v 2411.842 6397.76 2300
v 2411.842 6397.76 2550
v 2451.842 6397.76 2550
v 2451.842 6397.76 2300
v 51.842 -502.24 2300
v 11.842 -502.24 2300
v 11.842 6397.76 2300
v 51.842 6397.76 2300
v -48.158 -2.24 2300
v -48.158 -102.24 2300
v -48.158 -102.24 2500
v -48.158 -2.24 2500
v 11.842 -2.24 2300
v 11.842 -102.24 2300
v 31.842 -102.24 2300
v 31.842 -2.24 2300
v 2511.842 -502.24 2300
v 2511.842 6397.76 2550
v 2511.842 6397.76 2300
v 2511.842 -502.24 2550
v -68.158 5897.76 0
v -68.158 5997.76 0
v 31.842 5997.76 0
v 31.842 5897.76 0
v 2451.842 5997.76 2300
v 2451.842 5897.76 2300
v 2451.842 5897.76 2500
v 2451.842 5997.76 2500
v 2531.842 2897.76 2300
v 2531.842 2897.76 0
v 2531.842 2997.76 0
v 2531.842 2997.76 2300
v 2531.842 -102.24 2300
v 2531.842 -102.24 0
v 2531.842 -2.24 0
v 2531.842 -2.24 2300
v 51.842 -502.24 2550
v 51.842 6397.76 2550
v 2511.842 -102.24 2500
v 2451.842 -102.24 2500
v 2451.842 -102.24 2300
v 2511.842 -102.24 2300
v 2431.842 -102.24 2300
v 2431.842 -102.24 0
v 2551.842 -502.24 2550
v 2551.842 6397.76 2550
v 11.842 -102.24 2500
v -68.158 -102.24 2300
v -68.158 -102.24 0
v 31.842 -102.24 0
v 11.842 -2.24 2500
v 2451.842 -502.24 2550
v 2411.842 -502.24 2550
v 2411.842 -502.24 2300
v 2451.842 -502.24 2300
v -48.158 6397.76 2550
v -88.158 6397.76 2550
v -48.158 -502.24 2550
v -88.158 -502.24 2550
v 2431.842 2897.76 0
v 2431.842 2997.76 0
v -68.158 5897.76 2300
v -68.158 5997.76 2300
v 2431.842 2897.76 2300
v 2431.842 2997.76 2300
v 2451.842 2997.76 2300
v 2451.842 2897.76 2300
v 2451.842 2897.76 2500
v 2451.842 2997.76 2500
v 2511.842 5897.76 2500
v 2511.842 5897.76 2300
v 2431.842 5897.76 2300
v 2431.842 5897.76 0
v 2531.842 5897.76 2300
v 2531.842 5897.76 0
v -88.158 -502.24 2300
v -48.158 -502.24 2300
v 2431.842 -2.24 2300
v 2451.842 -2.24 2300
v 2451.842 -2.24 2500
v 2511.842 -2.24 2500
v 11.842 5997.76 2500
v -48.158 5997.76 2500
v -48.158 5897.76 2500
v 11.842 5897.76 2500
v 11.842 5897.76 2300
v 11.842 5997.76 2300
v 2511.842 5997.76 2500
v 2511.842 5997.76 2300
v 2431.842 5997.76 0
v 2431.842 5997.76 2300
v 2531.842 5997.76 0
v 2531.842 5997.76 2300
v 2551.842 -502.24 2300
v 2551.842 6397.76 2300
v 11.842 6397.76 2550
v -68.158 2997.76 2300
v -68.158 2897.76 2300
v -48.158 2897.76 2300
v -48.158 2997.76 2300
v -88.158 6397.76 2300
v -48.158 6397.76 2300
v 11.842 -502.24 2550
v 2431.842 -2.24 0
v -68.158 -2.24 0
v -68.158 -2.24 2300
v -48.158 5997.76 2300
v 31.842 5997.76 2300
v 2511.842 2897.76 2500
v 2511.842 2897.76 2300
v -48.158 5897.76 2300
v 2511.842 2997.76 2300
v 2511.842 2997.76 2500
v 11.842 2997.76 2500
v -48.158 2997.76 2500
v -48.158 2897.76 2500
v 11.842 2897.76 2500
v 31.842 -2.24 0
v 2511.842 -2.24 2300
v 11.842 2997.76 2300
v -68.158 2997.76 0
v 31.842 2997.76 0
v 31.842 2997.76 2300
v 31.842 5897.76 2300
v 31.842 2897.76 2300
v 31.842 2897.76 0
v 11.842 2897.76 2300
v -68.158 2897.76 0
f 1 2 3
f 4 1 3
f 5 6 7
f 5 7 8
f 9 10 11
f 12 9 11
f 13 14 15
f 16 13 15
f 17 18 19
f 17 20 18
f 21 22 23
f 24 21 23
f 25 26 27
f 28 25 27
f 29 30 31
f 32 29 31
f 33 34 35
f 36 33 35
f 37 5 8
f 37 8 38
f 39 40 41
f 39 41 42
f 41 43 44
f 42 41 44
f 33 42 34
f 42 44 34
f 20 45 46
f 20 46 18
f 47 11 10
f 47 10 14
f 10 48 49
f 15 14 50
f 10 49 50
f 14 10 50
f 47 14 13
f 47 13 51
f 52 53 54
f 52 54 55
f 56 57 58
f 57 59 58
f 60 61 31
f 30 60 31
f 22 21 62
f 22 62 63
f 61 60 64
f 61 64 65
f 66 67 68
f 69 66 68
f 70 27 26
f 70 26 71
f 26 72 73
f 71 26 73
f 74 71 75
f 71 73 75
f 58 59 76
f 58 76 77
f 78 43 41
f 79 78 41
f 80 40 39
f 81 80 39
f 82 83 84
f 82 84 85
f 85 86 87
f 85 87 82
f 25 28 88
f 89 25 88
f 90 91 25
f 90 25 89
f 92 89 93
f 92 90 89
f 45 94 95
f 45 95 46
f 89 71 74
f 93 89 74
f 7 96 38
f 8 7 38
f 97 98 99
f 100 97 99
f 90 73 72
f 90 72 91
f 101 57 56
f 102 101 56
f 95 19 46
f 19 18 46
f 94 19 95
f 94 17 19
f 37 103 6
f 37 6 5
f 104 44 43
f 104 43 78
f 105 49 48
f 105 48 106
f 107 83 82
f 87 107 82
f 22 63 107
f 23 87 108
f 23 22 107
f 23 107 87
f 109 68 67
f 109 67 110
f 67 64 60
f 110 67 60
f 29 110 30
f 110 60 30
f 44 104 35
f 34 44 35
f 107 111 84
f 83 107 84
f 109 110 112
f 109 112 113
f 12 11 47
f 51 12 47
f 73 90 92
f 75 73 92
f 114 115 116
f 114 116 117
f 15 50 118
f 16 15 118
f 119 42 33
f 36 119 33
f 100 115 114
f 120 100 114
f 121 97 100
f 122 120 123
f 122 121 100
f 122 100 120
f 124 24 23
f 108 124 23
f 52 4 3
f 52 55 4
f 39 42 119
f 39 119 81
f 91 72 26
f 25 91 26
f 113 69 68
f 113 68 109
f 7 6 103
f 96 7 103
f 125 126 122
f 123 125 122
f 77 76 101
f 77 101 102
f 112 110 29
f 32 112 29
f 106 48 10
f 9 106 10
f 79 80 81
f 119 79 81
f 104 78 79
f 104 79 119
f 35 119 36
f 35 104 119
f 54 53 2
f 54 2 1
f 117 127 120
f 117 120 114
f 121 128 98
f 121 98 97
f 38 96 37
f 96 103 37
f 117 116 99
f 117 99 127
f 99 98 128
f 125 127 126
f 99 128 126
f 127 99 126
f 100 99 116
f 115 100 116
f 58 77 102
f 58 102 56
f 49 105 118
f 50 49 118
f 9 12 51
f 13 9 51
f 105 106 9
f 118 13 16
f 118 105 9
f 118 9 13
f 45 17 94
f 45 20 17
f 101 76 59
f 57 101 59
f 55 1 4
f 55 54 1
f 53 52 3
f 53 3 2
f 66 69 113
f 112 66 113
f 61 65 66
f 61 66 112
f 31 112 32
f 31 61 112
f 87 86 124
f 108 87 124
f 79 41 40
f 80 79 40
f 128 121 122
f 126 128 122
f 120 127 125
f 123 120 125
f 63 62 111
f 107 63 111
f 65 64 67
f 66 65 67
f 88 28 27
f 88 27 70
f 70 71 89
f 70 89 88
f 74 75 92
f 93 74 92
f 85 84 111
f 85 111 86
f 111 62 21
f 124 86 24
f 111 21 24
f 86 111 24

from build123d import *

# Parameters (mm, degrees)
F2_W          = 100
F2_H          = 100
F3_DEPTH      = 2500
F4_W          = 20
F4_H          = 200
F5_DEPTH      = 6100.001
F7_DEPTH      = 400
F7_DEPTH_BACK = 6500
F6_W          = 40
F6_H          = 250


with BuildPart() as f3:
    # F2 (on Top) → F3 (new body)
    with BuildSketch(Plane.XY):
        with Locations((-18.1580890232, -52.2396657616)):
            Rectangle(F2_W, F2_H)
    extrude(amount=F3_DEPTH)


with BuildPart() as f3b:
    # F2 (on Top) → F3, piece 2 (new body)
    with BuildSketch(Plane.XY):
        with Locations((-18.1580890232, 2947.7603342384)):
            Rectangle(F2_W, F2_H)
    extrude(amount=F3_DEPTH)


with BuildPart() as f3c:
    # F2 (on Top) → F3, piece 3 (new body)
    with BuildSketch(Plane.XY):
        with Locations((-18.1580890232, 5947.7603342384)):
            Rectangle(F2_W, F2_H)
    extrude(amount=F3_DEPTH)


with BuildPart() as f3d:
    # F2 (on Top) → F3, piece 4 (new body)
    with BuildSketch(Plane.XY):
        with Locations((2481.8419109768, 2947.7603342384)):
            Rectangle(F2_W, F2_H)
    extrude(amount=F3_DEPTH)


with BuildPart() as f3e:
    # F2 (on Top) → F3, piece 5 (new body)
    with BuildSketch(Plane.XY):
        with Locations((2481.8419109768, -52.2396657616)):
            Rectangle(F2_W, F2_H)
    extrude(amount=F3_DEPTH)


with BuildPart() as f3f:
    # F2 (on Top) → F3, piece 6 (new body)
    with BuildSketch(Plane.XY):
        with Locations((2481.8419109768, 5947.7603342384)):
            Rectangle(F2_W, F2_H)
    extrude(amount=F3_DEPTH)


with BuildPart() as f5_tool:
    # F4 (on face) → F5 (new body, through all)
    with BuildSketch(Plane.XZ.offset(102.2396657616)):
        with Locations((-58.1580890232, 2400)):
            Rectangle(F4_W, F4_H)
        with Locations((21.8419109768, 2400)):
            Rectangle(F4_W, F4_H)
        with Locations((2441.8419109768, 2400)):
            Rectangle(F4_W, F4_H)
        with Locations((2521.8419109768, 2400)):
            Rectangle(F4_W, F4_H)
    extrude(amount=-F5_DEPTH)


with BuildPart() as f3_1:
    add(f3.part)

    # F5: cut by f5_tool
    add(f5_tool.part, mode=Mode.SUBTRACT)


with BuildPart() as f3b_1:
    add(f3b.part)

    # F5: cut by f5_tool
    add(f5_tool.part, mode=Mode.SUBTRACT)


with BuildPart() as f3c_1:
    add(f3c.part)

    # F5: cut by f5_tool
    add(f5_tool.part, mode=Mode.SUBTRACT)


with BuildPart() as f3d_1:
    add(f3d.part)

    # F5: cut by f5_tool
    add(f5_tool.part, mode=Mode.SUBTRACT)


with BuildPart() as f3e_1:
    add(f3e.part)

    # F5: cut by f5_tool
    add(f5_tool.part, mode=Mode.SUBTRACT)


with BuildPart() as f3f_1:
    add(f3f.part)

    # F5: cut by f5_tool
    add(f5_tool.part, mode=Mode.SUBTRACT)


with BuildPart() as f7:
    # F6 (on face) → F7 (new body, two sides)
    with BuildSketch(Plane.XZ.offset(102.2396657616)) as f7_sk:
        Polygon((2451.8419109768, 2300), (2451.8419109768, 2500), (2451.8419109768, 2550), (2411.8419109768, 2550), (2411.8419109768, 2300), (2431.8419109768, 2300), align=None)
    extrude(amount=F7_DEPTH)
    extrude(f7_sk.sketch, amount=-F7_DEPTH_BACK)


with BuildPart() as f7b:
    # F6 (on face) → F7, piece 2 (new body, two sides)
    with BuildSketch(Plane.XZ.offset(102.2396657616)) as f7_2_sk:
        Polygon((2511.8419109768, 2500), (2511.8419109768, 2300), (2531.8419109768, 2300), (2551.8419109768, 2300), (2551.8419109768, 2550), (2511.8419109768, 2550), align=None)
    extrude(amount=F7_DEPTH)
    extrude(f7_2_sk.sketch, amount=-F7_DEPTH_BACK)


with BuildPart() as f7c:
    # F6 (on face) → F7, piece 3 (new body, two sides)
    with BuildSketch(Plane.XZ.offset(102.2396657616)) as f7_3_sk:
        with Locations((-68.1580890232, 2425)):
            Rectangle(F6_W, F6_H)
    extrude(amount=F7_DEPTH)
    extrude(f7_3_sk.sketch, amount=-F7_DEPTH_BACK)


with BuildPart() as f7d:
    # F6 (on face) → F7, piece 4 (new body, two sides)
    with BuildSketch(Plane.XZ.offset(102.2396657616)) as f7_4_sk:
        with Locations((31.8419109768, 2425)):
            Rectangle(F6_W, F6_H)
    extrude(amount=F7_DEPTH)
    extrude(f7_4_sk.sketch, amount=-F7_DEPTH_BACK)


solid = Compound([f3_1.part, f3b_1.part, f3c_1.part, f3d_1.part, f3e_1.part, f3f_1.part, f7.part, f7b.part, f7c.part, f7d.part])
